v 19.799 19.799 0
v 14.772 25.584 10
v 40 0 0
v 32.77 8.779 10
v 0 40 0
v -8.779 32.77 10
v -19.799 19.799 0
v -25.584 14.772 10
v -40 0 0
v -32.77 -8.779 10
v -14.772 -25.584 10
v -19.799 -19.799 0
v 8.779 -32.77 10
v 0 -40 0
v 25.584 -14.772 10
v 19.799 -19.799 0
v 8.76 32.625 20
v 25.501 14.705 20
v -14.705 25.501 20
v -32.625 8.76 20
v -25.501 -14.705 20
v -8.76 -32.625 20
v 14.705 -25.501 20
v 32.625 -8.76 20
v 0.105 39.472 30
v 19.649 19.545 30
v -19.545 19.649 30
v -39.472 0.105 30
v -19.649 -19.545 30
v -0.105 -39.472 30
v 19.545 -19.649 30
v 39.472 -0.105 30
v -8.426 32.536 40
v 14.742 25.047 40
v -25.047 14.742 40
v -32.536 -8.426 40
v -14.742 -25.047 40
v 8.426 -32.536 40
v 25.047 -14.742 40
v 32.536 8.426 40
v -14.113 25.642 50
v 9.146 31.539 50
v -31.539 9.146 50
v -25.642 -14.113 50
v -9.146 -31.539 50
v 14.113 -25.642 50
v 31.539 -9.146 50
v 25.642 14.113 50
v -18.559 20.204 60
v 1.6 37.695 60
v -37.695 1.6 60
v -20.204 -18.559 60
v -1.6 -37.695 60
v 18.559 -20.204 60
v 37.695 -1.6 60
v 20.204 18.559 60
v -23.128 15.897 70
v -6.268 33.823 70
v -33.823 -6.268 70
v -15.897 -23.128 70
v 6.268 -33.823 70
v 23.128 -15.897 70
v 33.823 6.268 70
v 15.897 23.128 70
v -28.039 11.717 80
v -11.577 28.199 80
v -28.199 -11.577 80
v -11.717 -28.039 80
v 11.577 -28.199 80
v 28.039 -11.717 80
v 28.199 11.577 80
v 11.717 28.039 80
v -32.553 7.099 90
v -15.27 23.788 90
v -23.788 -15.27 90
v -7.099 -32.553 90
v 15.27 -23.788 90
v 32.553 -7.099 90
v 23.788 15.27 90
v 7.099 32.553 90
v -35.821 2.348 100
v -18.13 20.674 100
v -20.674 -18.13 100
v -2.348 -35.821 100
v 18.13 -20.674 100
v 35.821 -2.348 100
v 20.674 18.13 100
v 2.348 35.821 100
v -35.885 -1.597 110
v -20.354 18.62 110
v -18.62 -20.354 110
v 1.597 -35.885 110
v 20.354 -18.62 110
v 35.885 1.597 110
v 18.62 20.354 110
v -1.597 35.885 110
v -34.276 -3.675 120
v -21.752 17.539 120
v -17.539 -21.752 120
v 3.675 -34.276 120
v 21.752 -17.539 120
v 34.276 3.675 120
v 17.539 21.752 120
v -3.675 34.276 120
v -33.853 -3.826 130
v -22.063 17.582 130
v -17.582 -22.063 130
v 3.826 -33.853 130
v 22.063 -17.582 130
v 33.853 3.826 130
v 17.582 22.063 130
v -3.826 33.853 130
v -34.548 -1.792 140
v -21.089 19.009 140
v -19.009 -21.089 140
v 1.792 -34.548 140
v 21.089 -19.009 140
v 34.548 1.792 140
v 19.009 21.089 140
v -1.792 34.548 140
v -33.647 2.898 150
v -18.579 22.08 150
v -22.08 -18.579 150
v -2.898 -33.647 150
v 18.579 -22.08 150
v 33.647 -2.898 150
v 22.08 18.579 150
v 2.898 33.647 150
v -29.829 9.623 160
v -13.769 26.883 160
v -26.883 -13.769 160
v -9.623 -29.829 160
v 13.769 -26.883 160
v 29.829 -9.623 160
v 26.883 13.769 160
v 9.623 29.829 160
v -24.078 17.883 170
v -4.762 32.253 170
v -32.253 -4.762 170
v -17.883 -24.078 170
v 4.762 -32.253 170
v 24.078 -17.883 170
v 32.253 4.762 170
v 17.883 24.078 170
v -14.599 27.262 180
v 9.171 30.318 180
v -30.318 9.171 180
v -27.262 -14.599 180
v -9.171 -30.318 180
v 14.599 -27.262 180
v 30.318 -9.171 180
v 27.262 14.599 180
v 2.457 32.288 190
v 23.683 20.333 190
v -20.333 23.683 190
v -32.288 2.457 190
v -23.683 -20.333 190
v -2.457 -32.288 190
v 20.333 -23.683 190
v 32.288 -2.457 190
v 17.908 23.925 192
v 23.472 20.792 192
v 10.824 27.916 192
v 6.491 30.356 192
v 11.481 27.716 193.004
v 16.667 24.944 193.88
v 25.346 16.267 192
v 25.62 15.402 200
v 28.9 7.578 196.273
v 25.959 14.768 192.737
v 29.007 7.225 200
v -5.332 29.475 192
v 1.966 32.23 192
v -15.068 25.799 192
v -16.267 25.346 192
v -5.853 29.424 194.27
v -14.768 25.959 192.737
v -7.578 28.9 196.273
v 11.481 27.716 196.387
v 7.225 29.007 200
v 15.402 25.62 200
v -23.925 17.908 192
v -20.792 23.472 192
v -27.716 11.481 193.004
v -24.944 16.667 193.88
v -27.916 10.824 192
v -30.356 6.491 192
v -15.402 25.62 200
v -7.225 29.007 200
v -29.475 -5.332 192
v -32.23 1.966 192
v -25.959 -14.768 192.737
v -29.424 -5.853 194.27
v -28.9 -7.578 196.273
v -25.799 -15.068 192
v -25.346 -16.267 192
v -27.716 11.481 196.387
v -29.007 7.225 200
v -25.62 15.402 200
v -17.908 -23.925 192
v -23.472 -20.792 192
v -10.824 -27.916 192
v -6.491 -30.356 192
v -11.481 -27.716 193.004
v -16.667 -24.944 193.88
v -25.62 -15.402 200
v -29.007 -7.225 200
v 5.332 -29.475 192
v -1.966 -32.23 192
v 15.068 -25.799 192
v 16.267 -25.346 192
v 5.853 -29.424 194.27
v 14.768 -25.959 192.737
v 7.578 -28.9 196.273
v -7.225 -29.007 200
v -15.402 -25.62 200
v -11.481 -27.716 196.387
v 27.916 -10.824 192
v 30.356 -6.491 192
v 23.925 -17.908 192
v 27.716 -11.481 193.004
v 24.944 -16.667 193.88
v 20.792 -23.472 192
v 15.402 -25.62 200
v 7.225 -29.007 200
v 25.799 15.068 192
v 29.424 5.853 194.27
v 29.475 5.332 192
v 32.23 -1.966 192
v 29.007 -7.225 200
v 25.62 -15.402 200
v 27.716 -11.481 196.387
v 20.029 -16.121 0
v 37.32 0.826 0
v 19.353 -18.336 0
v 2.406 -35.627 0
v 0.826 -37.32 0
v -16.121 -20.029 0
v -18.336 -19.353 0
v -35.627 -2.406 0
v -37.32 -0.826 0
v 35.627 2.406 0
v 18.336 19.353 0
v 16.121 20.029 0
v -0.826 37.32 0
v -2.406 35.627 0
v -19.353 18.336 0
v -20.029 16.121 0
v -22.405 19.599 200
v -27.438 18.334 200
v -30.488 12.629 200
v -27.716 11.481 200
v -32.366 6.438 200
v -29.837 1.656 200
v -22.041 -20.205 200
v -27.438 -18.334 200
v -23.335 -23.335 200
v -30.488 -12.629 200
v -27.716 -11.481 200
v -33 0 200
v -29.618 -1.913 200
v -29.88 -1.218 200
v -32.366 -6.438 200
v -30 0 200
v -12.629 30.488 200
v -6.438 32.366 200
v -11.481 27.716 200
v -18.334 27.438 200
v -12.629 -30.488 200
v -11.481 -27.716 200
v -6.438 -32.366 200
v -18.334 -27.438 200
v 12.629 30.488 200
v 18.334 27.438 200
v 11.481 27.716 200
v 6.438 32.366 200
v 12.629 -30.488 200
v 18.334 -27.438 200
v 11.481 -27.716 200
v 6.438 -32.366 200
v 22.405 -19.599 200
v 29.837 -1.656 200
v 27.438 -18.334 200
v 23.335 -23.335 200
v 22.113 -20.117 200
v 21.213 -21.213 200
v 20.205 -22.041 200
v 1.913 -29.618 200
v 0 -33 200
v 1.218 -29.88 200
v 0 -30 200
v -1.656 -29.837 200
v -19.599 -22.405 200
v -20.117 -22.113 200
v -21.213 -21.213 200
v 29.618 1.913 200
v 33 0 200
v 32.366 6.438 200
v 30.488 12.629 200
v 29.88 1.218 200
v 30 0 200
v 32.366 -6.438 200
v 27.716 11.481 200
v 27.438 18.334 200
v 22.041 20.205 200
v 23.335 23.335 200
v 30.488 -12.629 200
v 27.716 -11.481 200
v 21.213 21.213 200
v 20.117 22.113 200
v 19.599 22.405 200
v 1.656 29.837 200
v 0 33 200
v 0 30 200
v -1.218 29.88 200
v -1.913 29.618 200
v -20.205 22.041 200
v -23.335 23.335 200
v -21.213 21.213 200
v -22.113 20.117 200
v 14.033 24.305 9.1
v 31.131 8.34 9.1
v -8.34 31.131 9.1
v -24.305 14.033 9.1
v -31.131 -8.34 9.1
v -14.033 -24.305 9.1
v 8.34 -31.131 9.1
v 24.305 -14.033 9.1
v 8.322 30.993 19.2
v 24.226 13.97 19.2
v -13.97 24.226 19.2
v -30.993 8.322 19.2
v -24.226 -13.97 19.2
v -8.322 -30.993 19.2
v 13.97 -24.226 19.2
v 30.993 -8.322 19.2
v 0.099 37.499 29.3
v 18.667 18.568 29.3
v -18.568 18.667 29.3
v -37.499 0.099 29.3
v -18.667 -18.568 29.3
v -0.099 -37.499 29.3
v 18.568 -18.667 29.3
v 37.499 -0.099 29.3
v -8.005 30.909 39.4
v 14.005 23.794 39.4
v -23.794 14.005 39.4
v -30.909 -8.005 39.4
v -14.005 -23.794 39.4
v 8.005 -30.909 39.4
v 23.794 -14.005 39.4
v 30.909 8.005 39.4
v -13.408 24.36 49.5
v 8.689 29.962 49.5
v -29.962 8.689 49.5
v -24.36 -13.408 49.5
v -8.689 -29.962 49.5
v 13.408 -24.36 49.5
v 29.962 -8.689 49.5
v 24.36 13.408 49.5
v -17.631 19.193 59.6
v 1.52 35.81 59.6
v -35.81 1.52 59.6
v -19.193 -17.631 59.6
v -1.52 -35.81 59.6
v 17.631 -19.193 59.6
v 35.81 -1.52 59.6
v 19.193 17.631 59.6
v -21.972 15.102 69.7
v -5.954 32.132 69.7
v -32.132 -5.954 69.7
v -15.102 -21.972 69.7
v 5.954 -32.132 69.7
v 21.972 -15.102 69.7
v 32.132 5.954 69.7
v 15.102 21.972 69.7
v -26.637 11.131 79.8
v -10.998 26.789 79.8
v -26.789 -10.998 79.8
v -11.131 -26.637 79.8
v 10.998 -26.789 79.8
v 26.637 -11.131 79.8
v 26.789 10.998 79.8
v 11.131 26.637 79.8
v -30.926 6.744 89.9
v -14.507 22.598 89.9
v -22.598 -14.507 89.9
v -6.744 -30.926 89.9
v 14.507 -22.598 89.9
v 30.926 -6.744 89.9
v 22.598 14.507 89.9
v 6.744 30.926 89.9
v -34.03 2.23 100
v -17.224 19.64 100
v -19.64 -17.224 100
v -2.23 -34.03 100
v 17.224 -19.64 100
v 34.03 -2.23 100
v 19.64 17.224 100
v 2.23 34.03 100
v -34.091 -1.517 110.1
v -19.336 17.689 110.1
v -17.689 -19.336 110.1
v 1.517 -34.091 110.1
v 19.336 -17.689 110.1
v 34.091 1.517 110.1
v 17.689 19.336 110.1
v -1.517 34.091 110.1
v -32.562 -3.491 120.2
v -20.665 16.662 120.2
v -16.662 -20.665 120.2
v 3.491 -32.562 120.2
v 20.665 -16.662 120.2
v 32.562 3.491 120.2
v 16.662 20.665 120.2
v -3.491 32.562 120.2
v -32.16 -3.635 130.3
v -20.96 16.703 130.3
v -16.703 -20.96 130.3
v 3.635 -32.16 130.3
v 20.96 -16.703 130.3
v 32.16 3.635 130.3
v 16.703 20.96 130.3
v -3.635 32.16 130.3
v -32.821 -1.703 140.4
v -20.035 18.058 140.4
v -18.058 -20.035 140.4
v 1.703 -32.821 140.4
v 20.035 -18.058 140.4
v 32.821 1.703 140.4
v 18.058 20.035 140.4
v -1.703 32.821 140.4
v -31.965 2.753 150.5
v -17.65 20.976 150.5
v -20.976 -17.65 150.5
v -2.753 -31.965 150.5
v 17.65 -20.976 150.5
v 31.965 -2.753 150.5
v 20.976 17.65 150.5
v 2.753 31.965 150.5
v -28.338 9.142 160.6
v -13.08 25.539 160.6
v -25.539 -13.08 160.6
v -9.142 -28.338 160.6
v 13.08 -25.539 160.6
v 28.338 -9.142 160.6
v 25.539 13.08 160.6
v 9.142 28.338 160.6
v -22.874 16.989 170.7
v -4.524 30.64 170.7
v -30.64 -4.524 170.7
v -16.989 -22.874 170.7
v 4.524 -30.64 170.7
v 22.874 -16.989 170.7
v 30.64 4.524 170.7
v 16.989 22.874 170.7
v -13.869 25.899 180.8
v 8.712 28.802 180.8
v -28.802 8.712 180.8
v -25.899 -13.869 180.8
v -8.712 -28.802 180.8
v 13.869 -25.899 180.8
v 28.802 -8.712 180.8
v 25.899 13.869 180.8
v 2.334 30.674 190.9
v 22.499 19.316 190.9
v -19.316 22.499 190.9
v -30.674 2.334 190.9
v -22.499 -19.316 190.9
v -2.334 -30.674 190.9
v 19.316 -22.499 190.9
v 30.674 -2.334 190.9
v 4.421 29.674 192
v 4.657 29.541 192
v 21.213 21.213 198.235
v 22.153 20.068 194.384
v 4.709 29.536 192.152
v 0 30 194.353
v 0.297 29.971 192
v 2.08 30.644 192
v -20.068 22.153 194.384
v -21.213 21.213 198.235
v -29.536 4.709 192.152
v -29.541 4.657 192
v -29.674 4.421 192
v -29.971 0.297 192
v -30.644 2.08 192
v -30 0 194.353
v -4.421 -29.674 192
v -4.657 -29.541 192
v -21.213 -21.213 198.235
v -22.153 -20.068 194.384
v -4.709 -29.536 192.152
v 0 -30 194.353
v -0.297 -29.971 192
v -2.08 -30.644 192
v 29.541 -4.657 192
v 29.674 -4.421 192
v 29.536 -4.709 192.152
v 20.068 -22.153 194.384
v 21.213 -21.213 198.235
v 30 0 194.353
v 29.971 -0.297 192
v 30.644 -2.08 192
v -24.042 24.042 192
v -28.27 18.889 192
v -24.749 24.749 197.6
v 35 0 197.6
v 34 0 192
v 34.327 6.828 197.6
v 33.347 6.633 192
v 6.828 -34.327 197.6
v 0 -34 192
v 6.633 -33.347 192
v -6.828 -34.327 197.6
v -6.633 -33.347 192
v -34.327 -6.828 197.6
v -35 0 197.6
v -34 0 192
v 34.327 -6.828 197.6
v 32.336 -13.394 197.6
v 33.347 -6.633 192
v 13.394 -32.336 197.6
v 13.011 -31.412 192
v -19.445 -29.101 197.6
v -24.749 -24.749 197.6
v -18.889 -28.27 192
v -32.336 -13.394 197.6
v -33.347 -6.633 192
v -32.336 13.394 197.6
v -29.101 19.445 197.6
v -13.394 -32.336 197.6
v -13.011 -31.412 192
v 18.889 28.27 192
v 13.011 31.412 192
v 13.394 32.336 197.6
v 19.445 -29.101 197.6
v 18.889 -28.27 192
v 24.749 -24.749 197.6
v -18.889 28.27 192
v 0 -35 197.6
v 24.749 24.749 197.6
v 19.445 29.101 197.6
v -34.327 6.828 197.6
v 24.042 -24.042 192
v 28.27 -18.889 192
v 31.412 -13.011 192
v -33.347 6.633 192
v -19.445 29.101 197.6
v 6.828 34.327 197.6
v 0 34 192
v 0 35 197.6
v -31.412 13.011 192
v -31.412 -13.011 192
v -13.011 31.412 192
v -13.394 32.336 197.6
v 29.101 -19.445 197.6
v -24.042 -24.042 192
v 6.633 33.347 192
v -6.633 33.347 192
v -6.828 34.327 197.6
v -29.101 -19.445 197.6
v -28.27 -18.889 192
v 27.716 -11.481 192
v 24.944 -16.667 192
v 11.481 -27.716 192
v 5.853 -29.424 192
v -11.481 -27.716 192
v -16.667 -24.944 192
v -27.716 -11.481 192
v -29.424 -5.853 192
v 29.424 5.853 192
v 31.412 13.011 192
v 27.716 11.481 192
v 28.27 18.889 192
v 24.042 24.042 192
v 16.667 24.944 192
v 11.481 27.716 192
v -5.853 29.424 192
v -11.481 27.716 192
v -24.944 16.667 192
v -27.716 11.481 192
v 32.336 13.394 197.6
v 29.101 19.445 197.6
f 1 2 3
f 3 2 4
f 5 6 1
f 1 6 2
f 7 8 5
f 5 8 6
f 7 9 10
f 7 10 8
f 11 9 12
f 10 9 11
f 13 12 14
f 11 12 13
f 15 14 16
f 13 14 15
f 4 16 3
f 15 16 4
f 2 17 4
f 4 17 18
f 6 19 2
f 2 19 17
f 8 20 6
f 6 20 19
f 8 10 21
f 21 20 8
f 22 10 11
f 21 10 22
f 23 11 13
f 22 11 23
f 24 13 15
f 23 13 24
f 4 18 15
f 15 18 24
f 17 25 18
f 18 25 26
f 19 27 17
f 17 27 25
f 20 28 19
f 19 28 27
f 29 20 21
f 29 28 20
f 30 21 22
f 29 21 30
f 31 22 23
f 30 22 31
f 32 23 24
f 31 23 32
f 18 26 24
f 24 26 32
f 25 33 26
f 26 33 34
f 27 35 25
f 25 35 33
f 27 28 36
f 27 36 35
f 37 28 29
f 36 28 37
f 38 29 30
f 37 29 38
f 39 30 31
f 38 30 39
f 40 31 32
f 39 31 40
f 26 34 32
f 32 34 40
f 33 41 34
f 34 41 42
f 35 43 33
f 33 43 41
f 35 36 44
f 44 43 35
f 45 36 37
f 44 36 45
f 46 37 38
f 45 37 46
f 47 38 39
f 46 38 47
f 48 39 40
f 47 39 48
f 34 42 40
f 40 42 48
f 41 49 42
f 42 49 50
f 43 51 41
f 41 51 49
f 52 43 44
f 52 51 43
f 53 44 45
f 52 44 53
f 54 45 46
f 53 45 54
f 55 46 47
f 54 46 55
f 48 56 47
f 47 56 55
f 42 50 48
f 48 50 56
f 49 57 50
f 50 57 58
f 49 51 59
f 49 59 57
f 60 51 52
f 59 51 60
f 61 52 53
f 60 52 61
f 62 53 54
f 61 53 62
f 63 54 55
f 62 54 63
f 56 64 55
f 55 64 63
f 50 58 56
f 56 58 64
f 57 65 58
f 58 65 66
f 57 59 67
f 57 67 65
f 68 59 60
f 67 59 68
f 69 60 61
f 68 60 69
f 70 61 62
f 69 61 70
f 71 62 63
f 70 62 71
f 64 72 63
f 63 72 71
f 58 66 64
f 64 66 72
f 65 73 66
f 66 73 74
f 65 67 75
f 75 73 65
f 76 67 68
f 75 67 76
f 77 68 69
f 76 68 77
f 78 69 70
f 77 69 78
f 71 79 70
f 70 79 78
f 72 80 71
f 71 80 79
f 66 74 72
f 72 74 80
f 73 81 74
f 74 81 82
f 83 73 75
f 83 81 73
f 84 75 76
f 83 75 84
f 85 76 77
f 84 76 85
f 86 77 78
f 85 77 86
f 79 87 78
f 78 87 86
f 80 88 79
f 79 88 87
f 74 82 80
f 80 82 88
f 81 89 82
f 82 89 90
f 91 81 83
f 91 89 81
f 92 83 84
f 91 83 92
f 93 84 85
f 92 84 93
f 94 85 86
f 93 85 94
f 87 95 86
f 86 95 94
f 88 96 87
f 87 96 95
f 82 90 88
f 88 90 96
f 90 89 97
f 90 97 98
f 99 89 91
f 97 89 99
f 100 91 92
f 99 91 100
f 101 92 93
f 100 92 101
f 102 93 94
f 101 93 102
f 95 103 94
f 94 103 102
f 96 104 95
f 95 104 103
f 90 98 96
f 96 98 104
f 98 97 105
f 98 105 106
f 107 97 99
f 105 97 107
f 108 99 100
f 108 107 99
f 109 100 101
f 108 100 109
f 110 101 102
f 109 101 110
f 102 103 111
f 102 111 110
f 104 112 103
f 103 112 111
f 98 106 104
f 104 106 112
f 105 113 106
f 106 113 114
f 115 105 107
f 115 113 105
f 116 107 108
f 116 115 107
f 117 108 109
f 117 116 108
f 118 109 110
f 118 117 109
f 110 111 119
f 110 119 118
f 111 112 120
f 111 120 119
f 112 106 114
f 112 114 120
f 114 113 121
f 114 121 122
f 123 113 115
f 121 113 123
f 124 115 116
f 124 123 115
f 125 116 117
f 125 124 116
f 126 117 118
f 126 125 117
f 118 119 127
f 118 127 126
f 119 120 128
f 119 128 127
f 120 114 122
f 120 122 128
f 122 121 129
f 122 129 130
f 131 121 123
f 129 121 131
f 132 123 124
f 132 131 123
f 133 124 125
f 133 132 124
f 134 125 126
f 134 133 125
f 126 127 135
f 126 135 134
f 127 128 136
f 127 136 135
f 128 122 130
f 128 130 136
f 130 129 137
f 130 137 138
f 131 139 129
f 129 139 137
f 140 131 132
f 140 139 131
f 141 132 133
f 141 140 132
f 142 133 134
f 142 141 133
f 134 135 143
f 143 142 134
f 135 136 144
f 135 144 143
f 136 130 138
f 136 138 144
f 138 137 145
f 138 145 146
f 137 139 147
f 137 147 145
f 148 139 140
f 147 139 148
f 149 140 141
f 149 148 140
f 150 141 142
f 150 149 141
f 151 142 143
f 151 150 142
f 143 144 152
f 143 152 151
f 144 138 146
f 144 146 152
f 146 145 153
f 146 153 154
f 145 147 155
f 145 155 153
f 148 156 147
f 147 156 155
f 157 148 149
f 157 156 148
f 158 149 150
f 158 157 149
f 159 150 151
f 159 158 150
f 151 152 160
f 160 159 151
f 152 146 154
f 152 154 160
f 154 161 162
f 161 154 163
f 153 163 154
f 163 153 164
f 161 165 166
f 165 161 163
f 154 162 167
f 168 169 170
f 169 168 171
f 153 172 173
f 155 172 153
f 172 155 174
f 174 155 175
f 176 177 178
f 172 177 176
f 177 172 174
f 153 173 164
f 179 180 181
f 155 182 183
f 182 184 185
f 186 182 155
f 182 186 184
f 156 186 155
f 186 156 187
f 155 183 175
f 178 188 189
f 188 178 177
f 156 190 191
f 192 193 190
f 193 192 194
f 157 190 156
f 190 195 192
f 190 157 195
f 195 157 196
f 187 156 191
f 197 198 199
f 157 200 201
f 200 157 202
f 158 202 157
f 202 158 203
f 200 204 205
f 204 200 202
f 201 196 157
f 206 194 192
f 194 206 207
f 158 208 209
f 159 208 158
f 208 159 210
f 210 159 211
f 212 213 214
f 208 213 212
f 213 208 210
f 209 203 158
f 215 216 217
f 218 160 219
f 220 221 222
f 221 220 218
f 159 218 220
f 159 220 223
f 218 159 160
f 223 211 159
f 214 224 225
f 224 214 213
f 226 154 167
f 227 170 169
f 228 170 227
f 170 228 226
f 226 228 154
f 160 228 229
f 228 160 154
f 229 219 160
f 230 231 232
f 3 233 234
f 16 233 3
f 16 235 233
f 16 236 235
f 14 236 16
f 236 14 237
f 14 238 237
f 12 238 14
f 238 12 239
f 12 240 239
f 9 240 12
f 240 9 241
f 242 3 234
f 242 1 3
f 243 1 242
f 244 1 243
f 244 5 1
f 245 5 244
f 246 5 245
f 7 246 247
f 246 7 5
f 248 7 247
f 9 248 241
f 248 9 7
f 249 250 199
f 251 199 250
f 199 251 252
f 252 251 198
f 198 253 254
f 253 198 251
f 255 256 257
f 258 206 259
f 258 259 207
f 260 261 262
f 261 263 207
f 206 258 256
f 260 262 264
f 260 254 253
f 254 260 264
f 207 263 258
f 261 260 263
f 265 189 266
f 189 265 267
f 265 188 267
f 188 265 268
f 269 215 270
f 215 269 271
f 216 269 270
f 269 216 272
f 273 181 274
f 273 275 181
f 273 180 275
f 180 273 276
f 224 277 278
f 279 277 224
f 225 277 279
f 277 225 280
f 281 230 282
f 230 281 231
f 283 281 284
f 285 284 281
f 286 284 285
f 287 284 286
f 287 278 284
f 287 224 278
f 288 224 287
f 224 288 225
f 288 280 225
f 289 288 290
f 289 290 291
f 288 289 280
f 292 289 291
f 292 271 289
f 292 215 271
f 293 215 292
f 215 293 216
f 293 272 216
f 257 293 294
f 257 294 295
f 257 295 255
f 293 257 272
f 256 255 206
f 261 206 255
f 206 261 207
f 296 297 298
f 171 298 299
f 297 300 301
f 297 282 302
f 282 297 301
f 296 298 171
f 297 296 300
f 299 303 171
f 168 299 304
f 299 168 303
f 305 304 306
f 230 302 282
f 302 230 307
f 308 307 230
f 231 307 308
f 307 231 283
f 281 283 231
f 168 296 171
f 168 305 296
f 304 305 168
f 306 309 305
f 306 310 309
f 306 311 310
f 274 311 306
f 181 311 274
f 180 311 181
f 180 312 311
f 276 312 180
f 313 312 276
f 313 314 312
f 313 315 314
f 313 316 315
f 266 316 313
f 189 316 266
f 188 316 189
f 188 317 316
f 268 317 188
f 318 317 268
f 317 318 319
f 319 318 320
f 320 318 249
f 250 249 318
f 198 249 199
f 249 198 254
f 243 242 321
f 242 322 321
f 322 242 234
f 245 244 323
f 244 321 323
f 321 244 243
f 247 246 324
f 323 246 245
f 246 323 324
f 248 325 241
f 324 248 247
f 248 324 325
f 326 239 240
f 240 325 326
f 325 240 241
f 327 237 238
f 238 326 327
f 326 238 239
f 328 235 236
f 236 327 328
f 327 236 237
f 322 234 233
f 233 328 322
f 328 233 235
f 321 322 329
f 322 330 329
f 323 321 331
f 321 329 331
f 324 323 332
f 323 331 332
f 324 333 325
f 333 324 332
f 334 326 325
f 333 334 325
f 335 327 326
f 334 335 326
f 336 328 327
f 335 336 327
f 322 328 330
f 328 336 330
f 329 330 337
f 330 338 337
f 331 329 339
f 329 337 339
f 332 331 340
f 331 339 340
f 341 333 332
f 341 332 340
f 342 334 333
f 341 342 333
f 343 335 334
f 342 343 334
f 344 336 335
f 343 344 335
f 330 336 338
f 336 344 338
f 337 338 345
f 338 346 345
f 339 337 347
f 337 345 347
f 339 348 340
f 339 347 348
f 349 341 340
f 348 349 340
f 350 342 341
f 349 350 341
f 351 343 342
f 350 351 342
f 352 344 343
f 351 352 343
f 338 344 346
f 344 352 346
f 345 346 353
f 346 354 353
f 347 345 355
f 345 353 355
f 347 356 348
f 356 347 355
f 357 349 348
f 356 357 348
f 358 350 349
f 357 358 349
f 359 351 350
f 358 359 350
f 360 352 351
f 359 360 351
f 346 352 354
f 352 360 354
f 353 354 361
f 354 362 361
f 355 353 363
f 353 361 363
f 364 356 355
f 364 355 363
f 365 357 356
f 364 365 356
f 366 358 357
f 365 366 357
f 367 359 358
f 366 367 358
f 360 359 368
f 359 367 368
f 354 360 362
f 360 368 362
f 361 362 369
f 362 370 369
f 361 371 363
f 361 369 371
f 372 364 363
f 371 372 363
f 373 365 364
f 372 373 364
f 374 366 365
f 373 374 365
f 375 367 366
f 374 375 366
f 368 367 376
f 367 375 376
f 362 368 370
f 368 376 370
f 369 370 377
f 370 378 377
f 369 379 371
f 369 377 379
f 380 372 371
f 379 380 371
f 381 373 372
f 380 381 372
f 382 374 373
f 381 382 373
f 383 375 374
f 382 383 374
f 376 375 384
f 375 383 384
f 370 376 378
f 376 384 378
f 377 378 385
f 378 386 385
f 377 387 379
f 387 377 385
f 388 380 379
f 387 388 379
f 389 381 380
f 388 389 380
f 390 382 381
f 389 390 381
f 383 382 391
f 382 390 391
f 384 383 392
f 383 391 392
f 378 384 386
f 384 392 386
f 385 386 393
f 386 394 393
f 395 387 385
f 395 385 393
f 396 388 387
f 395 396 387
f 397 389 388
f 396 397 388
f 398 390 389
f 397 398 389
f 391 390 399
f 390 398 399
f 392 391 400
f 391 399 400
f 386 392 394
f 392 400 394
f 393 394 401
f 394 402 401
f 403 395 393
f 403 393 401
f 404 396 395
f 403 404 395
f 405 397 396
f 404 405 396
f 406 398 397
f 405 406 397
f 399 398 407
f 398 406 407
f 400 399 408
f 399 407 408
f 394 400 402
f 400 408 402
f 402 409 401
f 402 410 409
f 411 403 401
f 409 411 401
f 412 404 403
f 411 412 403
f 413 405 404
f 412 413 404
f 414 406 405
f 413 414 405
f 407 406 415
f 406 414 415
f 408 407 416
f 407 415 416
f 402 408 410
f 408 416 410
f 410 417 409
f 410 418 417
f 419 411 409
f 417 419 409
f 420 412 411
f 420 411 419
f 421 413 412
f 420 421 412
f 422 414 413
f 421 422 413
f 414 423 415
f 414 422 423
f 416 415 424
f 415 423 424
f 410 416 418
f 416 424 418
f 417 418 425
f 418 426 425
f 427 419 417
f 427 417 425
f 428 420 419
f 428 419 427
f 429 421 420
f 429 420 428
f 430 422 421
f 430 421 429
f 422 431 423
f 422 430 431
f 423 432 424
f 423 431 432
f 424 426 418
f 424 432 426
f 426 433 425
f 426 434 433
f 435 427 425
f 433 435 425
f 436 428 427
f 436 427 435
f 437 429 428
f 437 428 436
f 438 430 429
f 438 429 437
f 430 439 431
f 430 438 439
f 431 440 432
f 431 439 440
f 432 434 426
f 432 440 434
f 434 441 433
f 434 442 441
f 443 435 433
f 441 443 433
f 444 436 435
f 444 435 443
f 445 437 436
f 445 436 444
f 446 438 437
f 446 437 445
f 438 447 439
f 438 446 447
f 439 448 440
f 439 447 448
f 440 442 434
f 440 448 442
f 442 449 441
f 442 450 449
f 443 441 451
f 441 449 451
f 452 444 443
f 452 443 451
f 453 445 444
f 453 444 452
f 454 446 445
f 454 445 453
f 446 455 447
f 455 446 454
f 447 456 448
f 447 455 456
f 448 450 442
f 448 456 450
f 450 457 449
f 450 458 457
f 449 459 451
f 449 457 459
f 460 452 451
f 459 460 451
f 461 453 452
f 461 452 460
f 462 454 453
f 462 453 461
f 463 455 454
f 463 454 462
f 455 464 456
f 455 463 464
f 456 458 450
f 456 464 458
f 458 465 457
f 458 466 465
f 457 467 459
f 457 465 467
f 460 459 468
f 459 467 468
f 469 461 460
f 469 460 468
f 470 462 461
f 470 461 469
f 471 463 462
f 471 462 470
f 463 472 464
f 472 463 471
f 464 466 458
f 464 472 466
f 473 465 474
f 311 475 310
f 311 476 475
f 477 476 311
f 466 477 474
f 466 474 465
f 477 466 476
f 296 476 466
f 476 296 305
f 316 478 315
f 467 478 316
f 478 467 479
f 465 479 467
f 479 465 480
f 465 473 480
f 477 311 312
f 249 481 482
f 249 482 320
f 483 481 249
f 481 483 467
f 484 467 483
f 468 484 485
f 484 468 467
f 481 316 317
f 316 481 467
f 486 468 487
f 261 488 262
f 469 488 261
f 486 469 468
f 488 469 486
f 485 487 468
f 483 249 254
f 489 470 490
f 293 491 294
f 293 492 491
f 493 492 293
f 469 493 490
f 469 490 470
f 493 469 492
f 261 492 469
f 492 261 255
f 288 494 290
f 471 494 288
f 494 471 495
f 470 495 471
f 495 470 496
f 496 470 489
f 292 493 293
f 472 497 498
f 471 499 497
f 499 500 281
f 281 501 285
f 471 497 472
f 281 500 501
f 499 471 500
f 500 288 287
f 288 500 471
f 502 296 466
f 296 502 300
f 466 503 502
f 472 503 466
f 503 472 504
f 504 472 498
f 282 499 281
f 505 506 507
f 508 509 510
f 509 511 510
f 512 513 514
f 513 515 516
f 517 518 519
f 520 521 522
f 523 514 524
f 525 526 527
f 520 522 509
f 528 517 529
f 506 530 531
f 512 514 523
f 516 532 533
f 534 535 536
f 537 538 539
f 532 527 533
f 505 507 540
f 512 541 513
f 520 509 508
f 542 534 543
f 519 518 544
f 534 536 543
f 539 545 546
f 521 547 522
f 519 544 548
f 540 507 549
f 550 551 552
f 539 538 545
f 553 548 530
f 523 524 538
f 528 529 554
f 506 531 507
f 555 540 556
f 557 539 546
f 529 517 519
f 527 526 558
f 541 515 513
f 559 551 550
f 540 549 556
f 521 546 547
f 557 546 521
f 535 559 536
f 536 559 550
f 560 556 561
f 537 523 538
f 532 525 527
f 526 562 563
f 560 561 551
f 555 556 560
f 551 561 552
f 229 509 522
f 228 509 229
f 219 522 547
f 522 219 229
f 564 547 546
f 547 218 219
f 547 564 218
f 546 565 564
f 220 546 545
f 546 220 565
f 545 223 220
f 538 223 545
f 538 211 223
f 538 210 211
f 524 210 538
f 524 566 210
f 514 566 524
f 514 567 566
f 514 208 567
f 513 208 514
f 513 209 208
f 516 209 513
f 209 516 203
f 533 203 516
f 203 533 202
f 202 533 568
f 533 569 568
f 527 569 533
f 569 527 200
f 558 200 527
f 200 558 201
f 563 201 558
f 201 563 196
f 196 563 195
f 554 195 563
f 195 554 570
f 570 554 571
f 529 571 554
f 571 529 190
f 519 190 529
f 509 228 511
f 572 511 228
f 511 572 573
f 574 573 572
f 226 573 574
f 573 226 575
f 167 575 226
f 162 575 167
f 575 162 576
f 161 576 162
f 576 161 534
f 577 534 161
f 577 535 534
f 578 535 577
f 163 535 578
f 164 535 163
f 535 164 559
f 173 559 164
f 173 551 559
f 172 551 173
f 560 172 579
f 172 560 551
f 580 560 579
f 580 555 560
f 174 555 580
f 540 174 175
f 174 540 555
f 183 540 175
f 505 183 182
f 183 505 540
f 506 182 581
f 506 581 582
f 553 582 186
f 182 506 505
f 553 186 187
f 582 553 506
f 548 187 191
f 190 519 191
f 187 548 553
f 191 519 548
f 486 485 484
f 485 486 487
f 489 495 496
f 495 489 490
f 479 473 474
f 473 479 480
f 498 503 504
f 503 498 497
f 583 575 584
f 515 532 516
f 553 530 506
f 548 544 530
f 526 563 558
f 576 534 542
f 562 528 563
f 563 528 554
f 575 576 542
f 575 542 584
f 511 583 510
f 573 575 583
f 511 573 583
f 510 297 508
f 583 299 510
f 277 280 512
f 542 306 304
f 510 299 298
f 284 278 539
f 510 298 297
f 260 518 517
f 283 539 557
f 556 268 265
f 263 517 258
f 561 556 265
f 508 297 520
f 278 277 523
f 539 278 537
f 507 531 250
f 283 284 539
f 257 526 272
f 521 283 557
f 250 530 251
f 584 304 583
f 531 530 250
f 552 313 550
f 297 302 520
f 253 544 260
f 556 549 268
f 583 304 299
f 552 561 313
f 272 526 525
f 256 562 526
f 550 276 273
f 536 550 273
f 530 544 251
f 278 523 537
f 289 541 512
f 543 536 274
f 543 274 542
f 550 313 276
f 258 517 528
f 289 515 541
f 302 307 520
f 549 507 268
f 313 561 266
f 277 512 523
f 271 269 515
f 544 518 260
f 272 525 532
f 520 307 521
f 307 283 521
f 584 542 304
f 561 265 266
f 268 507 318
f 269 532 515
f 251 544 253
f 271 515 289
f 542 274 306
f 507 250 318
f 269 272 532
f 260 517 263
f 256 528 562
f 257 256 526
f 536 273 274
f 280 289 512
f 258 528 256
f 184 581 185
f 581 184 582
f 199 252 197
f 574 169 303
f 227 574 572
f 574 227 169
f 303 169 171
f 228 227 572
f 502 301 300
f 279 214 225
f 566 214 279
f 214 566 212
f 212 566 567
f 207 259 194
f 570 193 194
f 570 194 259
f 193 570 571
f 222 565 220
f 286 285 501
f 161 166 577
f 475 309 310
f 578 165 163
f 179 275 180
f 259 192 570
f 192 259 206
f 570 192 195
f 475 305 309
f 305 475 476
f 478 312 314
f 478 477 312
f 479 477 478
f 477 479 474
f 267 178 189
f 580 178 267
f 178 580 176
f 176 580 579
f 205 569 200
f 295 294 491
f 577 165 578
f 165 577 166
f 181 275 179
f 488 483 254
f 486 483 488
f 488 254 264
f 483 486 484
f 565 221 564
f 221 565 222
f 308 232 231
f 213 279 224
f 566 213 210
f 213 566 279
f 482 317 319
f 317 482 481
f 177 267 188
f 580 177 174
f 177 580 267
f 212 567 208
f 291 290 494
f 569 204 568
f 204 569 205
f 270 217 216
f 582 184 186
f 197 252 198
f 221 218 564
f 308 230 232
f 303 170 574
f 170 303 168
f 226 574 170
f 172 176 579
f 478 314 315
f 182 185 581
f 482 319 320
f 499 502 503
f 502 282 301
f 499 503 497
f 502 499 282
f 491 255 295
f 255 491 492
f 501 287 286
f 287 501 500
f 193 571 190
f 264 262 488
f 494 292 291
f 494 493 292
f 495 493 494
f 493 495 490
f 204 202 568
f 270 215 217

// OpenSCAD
// Diamond Crown Vase - A faceted vase with crystalline pattern
// Parameters for the faceted vase
height = 200;           // Total height
base_radius = 40;       // Base radius
segments = 8;           // Number of main segments
layers = 20;           // Increased layers for smoother transition
indent_factor = 0.3;    // How deep the facets go
twist_angle = 15;      // Degrees of twist per layer
neck_ratio = 0.8;      // Adjusted for smoother top
wall_thickness = 2;    // Thickness of the vase wall
color_vase = "Teal";   // Vase color
rim_height = 8;        // Height of the decorative rim

module diamond_crown_vase() {
    // Calculate points for each layer with smoothing factor
    points = [
        for(layer = [0:layers])
            let(
                layer_ratio = layer/layers,
                layer_height = height * layer_ratio,
                // Smooth transition near the top
                smooth_factor = 1 - pow(layer_ratio, 3),
                layer_radius = base_radius * (1 - (1 - neck_ratio) * pow(layer_ratio, 1.5)),
                layer_twist = layer * twist_angle * smooth_factor
            )
            for(seg = [0:segments-1])
                let(
                    angle = 360 * seg / segments + layer_twist,
                    // Gradual reduction of indentation near top
                    current_indent = indent_factor * smooth_factor,
                    radius_mod = layer_radius * (1 - current_indent * abs(sin(angle * 2))),
                    x = radius_mod * cos(angle),
                    y = radius_mod * sin(angle),
                    z = layer_height
                )
                [x, y, z]
    ];

    // Generate faces with improved topology
    faces = concat(
        // Side faces
        [
            for(layer = [0:layers-1])
                for(seg = [0:segments-1])
                    let(
                        current = layer * segments + seg,
                        next = layer * segments + ((seg + 1) % segments),
                        above_current = (layer + 1) * segments + seg,
                        above_next = (layer + 1) * segments + ((seg + 1) % segments)
                    )
                    each [
                        [current, next, above_next],
                        [current, above_next, above_current]
                    ]
        ],
        // Bottom cap
        [[for(seg = [segments-1:-1:0]) seg]],
        // Top cap with improved vertex ordering
        [[for(seg = [0:segments-1]) layers * segments + seg]]
    );

    // Create hollow vase with improved wall generation
    module hollow_vase() {
        difference() {
            // Outer shell
            polyhedron(
                points = points,
                faces = faces,
                convexity = 10
            );
            
            // Inner shell with smooth transition
            translate([0, 0, -1])
            scale([(base_radius - wall_thickness)/base_radius, 
                   (base_radius - wall_thickness)/base_radius, 
                   1.01])
            polyhedron(
                points = points,
                faces = faces,
                convexity = 10
            );
            
            // Flat bottom
            translate([0, 0, -1])
            cube([base_radius * 3, base_radius * 3, 2], center=true);
        }
    }

    // Improved decorative rim design
    module crown_rim() {
        translate([0, 0, height - rim_height]) {
            difference() {
                // Outer rim
                union() {
                    // Main rim body
                    cylinder(
                        r1 = base_radius * neck_ratio + 2,
                        r2 = base_radius * neck_ratio + 3,
                        h = rim_height * 0.7,
                        $fn = segments * 4
                    );
                    // Decorative top lip
                    translate([0, 0, rim_height * 0.7])
                    cylinder(
                        r1 = base_radius * neck_ratio + 3,
                        r2 = base_radius * neck_ratio + 1,
                        h = rim_height * 0.3,
                        $fn = segments * 4
                    );
                }
                // Inner hollow
                translate([0, 0, -1])
                cylinder(
                    r = base_radius * neck_ratio - wall_thickness,
                    h = rim_height + 2,
                    $fn = segments * 4
                );
            }
        }
    }

    // Render complete vase
    color(color_vase) {
        hollow_vase();
        crown_rim();
    }
}

// Render the Diamond Crown Vase
diamond_crown_vase();
